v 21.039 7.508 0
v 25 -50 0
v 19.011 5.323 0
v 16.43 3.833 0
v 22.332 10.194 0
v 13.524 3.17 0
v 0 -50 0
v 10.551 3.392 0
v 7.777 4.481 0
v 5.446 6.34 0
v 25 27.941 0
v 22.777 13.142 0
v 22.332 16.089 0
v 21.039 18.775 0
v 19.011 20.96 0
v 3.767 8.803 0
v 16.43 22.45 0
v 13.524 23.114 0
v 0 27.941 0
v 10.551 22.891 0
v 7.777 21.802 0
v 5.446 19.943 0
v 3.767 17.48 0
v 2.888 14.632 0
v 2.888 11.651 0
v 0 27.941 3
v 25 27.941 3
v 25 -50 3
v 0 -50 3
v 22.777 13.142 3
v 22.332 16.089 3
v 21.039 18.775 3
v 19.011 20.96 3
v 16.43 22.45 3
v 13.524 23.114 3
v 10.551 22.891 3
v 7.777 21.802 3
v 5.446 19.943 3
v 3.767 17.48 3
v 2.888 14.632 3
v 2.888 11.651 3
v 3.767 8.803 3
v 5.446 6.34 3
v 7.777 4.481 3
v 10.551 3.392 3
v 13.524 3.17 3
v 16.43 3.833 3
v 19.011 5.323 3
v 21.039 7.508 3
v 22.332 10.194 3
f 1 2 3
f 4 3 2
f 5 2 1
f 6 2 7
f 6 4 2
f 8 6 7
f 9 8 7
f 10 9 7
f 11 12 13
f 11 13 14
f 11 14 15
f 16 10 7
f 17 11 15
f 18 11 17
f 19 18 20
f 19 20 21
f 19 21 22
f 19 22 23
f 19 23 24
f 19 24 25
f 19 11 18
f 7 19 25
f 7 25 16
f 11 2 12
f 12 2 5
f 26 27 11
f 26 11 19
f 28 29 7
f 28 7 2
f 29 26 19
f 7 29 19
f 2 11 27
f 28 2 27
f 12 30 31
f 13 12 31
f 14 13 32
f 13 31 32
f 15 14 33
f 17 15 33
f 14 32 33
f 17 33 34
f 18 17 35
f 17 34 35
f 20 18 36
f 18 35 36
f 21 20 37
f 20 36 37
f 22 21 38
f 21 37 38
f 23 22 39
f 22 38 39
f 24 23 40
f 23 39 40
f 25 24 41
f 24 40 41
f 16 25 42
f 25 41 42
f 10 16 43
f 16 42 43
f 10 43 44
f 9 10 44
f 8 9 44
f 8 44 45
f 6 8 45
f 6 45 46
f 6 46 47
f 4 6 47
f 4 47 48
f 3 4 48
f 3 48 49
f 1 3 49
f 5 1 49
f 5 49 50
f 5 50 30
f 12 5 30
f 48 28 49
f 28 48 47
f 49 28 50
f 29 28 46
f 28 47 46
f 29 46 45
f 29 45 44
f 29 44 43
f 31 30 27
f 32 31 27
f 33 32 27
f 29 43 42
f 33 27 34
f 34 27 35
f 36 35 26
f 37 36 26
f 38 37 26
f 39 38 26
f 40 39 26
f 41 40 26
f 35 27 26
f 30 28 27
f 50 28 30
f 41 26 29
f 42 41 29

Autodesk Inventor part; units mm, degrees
ref_plane "YZ Plane" through (0, 0, 0) normal (1, 0, 0) x (0, 1, 0)
ref_plane "XZ Plane" through (0, 0, 0) normal (0, 1, 0) x (-1, 0, 0)
ref_plane "XY Plane" through (0, 0, 0) normal (0, 0, 1) x (1, 0, 0)
sketch "Sketch1" plane through (0, 0, 0) normal (0, 0, 1) x (1, 0, 0)
  line L0 (0, 0) -> (0, 80)
  line L1 (0, 0) -> (25, 0)
  line L2 (25, 0) -> (25, 80)
  arc A0 (25, 80) -> (0, 80) centre (12.5, 58.3494) ccw
  dimension "d2" = 80
  dimension "d4" = 25
  dimension "d5" = 80
  dimension "d6" = 25
extrude "Extrusion1" add sketch "Sketch1" along normal blind 3
sketch "Sketch2" plane through (0, 0, 3) normal (0, 0, 1) x (1, 0, 0)
  circle A0 centre (12.5, 67.7859) radius 10
  point P0 (0, 0)
  dimension "d9" = 20
extrude "Extrusion2" cut sketch "Sketch2" against normal blind 3
sketch "Sketch3" plane through (0, 0, 0) normal (0, -1, 0) x (1, 0, 0)
  line L0 (25, 0) -> (0, 0) projected
  line L1 (25, 3) -> (0, 3) projected
  line L2 (0, 0) -> (25, 0)
  line L3 (25, 0) -> (25, 3)
  line L4 (25, 3) -> (0, 3)
  line L5 (0, 3) -> (0, 0)
extrude "Extrusion3" add sketch "Sketch3" along normal blind 50
sketch "Sketch4" plane through (0, -50, 0) normal (0, -1, 0) x (1, 0, 0)
  line L0 (0, 0) -> (0, 3) projected
  line L1 (25, 0) -> (25, 3) projected
  line L2 (0, 3) -> (25, 3)
  line L3 (25, 3) -> (25, 0)
  line L4 (25, 0) -> (0, 0)
  line L5 (0, 0) -> (0, 3)
sketch "Sketch5" plane through (0, 0, 3) normal (0, 0, 1) x (1, 0, 0)
  circle A0 centre (12.7766, 13.1416) radius 10
  point P0 (0, 0)
  dimension "d14" = 20
extrude "Extrusion4" cut sketch "Sketch5" against normal blind 50
sketch "Sketch6" plane through (0, 0, 3) normal (0, 0, 1) x (1, 0, 0)
  line L0 (31.6061, 27.9408) -> (-29.0129, 27.9408)
  line L1 (-29.0129, 27.9408) -> (-29.0129, 90.0456)
  line L2 (-29.0129, 90.0456) -> (31.6061, 90.0456)
  line L3 (31.6061, 90.0456) -> (31.6061, 27.9408)
  point P0 (0, 0)
extrude "Extrusion5" cut sketch "Sketch6" against normal blind 50
sketch "Sketch7" plane through (0, 0, 3) normal (0, 0, 1) x (1, 0, 0)
  point P0 (0, 0)
properties part number "roller support"
